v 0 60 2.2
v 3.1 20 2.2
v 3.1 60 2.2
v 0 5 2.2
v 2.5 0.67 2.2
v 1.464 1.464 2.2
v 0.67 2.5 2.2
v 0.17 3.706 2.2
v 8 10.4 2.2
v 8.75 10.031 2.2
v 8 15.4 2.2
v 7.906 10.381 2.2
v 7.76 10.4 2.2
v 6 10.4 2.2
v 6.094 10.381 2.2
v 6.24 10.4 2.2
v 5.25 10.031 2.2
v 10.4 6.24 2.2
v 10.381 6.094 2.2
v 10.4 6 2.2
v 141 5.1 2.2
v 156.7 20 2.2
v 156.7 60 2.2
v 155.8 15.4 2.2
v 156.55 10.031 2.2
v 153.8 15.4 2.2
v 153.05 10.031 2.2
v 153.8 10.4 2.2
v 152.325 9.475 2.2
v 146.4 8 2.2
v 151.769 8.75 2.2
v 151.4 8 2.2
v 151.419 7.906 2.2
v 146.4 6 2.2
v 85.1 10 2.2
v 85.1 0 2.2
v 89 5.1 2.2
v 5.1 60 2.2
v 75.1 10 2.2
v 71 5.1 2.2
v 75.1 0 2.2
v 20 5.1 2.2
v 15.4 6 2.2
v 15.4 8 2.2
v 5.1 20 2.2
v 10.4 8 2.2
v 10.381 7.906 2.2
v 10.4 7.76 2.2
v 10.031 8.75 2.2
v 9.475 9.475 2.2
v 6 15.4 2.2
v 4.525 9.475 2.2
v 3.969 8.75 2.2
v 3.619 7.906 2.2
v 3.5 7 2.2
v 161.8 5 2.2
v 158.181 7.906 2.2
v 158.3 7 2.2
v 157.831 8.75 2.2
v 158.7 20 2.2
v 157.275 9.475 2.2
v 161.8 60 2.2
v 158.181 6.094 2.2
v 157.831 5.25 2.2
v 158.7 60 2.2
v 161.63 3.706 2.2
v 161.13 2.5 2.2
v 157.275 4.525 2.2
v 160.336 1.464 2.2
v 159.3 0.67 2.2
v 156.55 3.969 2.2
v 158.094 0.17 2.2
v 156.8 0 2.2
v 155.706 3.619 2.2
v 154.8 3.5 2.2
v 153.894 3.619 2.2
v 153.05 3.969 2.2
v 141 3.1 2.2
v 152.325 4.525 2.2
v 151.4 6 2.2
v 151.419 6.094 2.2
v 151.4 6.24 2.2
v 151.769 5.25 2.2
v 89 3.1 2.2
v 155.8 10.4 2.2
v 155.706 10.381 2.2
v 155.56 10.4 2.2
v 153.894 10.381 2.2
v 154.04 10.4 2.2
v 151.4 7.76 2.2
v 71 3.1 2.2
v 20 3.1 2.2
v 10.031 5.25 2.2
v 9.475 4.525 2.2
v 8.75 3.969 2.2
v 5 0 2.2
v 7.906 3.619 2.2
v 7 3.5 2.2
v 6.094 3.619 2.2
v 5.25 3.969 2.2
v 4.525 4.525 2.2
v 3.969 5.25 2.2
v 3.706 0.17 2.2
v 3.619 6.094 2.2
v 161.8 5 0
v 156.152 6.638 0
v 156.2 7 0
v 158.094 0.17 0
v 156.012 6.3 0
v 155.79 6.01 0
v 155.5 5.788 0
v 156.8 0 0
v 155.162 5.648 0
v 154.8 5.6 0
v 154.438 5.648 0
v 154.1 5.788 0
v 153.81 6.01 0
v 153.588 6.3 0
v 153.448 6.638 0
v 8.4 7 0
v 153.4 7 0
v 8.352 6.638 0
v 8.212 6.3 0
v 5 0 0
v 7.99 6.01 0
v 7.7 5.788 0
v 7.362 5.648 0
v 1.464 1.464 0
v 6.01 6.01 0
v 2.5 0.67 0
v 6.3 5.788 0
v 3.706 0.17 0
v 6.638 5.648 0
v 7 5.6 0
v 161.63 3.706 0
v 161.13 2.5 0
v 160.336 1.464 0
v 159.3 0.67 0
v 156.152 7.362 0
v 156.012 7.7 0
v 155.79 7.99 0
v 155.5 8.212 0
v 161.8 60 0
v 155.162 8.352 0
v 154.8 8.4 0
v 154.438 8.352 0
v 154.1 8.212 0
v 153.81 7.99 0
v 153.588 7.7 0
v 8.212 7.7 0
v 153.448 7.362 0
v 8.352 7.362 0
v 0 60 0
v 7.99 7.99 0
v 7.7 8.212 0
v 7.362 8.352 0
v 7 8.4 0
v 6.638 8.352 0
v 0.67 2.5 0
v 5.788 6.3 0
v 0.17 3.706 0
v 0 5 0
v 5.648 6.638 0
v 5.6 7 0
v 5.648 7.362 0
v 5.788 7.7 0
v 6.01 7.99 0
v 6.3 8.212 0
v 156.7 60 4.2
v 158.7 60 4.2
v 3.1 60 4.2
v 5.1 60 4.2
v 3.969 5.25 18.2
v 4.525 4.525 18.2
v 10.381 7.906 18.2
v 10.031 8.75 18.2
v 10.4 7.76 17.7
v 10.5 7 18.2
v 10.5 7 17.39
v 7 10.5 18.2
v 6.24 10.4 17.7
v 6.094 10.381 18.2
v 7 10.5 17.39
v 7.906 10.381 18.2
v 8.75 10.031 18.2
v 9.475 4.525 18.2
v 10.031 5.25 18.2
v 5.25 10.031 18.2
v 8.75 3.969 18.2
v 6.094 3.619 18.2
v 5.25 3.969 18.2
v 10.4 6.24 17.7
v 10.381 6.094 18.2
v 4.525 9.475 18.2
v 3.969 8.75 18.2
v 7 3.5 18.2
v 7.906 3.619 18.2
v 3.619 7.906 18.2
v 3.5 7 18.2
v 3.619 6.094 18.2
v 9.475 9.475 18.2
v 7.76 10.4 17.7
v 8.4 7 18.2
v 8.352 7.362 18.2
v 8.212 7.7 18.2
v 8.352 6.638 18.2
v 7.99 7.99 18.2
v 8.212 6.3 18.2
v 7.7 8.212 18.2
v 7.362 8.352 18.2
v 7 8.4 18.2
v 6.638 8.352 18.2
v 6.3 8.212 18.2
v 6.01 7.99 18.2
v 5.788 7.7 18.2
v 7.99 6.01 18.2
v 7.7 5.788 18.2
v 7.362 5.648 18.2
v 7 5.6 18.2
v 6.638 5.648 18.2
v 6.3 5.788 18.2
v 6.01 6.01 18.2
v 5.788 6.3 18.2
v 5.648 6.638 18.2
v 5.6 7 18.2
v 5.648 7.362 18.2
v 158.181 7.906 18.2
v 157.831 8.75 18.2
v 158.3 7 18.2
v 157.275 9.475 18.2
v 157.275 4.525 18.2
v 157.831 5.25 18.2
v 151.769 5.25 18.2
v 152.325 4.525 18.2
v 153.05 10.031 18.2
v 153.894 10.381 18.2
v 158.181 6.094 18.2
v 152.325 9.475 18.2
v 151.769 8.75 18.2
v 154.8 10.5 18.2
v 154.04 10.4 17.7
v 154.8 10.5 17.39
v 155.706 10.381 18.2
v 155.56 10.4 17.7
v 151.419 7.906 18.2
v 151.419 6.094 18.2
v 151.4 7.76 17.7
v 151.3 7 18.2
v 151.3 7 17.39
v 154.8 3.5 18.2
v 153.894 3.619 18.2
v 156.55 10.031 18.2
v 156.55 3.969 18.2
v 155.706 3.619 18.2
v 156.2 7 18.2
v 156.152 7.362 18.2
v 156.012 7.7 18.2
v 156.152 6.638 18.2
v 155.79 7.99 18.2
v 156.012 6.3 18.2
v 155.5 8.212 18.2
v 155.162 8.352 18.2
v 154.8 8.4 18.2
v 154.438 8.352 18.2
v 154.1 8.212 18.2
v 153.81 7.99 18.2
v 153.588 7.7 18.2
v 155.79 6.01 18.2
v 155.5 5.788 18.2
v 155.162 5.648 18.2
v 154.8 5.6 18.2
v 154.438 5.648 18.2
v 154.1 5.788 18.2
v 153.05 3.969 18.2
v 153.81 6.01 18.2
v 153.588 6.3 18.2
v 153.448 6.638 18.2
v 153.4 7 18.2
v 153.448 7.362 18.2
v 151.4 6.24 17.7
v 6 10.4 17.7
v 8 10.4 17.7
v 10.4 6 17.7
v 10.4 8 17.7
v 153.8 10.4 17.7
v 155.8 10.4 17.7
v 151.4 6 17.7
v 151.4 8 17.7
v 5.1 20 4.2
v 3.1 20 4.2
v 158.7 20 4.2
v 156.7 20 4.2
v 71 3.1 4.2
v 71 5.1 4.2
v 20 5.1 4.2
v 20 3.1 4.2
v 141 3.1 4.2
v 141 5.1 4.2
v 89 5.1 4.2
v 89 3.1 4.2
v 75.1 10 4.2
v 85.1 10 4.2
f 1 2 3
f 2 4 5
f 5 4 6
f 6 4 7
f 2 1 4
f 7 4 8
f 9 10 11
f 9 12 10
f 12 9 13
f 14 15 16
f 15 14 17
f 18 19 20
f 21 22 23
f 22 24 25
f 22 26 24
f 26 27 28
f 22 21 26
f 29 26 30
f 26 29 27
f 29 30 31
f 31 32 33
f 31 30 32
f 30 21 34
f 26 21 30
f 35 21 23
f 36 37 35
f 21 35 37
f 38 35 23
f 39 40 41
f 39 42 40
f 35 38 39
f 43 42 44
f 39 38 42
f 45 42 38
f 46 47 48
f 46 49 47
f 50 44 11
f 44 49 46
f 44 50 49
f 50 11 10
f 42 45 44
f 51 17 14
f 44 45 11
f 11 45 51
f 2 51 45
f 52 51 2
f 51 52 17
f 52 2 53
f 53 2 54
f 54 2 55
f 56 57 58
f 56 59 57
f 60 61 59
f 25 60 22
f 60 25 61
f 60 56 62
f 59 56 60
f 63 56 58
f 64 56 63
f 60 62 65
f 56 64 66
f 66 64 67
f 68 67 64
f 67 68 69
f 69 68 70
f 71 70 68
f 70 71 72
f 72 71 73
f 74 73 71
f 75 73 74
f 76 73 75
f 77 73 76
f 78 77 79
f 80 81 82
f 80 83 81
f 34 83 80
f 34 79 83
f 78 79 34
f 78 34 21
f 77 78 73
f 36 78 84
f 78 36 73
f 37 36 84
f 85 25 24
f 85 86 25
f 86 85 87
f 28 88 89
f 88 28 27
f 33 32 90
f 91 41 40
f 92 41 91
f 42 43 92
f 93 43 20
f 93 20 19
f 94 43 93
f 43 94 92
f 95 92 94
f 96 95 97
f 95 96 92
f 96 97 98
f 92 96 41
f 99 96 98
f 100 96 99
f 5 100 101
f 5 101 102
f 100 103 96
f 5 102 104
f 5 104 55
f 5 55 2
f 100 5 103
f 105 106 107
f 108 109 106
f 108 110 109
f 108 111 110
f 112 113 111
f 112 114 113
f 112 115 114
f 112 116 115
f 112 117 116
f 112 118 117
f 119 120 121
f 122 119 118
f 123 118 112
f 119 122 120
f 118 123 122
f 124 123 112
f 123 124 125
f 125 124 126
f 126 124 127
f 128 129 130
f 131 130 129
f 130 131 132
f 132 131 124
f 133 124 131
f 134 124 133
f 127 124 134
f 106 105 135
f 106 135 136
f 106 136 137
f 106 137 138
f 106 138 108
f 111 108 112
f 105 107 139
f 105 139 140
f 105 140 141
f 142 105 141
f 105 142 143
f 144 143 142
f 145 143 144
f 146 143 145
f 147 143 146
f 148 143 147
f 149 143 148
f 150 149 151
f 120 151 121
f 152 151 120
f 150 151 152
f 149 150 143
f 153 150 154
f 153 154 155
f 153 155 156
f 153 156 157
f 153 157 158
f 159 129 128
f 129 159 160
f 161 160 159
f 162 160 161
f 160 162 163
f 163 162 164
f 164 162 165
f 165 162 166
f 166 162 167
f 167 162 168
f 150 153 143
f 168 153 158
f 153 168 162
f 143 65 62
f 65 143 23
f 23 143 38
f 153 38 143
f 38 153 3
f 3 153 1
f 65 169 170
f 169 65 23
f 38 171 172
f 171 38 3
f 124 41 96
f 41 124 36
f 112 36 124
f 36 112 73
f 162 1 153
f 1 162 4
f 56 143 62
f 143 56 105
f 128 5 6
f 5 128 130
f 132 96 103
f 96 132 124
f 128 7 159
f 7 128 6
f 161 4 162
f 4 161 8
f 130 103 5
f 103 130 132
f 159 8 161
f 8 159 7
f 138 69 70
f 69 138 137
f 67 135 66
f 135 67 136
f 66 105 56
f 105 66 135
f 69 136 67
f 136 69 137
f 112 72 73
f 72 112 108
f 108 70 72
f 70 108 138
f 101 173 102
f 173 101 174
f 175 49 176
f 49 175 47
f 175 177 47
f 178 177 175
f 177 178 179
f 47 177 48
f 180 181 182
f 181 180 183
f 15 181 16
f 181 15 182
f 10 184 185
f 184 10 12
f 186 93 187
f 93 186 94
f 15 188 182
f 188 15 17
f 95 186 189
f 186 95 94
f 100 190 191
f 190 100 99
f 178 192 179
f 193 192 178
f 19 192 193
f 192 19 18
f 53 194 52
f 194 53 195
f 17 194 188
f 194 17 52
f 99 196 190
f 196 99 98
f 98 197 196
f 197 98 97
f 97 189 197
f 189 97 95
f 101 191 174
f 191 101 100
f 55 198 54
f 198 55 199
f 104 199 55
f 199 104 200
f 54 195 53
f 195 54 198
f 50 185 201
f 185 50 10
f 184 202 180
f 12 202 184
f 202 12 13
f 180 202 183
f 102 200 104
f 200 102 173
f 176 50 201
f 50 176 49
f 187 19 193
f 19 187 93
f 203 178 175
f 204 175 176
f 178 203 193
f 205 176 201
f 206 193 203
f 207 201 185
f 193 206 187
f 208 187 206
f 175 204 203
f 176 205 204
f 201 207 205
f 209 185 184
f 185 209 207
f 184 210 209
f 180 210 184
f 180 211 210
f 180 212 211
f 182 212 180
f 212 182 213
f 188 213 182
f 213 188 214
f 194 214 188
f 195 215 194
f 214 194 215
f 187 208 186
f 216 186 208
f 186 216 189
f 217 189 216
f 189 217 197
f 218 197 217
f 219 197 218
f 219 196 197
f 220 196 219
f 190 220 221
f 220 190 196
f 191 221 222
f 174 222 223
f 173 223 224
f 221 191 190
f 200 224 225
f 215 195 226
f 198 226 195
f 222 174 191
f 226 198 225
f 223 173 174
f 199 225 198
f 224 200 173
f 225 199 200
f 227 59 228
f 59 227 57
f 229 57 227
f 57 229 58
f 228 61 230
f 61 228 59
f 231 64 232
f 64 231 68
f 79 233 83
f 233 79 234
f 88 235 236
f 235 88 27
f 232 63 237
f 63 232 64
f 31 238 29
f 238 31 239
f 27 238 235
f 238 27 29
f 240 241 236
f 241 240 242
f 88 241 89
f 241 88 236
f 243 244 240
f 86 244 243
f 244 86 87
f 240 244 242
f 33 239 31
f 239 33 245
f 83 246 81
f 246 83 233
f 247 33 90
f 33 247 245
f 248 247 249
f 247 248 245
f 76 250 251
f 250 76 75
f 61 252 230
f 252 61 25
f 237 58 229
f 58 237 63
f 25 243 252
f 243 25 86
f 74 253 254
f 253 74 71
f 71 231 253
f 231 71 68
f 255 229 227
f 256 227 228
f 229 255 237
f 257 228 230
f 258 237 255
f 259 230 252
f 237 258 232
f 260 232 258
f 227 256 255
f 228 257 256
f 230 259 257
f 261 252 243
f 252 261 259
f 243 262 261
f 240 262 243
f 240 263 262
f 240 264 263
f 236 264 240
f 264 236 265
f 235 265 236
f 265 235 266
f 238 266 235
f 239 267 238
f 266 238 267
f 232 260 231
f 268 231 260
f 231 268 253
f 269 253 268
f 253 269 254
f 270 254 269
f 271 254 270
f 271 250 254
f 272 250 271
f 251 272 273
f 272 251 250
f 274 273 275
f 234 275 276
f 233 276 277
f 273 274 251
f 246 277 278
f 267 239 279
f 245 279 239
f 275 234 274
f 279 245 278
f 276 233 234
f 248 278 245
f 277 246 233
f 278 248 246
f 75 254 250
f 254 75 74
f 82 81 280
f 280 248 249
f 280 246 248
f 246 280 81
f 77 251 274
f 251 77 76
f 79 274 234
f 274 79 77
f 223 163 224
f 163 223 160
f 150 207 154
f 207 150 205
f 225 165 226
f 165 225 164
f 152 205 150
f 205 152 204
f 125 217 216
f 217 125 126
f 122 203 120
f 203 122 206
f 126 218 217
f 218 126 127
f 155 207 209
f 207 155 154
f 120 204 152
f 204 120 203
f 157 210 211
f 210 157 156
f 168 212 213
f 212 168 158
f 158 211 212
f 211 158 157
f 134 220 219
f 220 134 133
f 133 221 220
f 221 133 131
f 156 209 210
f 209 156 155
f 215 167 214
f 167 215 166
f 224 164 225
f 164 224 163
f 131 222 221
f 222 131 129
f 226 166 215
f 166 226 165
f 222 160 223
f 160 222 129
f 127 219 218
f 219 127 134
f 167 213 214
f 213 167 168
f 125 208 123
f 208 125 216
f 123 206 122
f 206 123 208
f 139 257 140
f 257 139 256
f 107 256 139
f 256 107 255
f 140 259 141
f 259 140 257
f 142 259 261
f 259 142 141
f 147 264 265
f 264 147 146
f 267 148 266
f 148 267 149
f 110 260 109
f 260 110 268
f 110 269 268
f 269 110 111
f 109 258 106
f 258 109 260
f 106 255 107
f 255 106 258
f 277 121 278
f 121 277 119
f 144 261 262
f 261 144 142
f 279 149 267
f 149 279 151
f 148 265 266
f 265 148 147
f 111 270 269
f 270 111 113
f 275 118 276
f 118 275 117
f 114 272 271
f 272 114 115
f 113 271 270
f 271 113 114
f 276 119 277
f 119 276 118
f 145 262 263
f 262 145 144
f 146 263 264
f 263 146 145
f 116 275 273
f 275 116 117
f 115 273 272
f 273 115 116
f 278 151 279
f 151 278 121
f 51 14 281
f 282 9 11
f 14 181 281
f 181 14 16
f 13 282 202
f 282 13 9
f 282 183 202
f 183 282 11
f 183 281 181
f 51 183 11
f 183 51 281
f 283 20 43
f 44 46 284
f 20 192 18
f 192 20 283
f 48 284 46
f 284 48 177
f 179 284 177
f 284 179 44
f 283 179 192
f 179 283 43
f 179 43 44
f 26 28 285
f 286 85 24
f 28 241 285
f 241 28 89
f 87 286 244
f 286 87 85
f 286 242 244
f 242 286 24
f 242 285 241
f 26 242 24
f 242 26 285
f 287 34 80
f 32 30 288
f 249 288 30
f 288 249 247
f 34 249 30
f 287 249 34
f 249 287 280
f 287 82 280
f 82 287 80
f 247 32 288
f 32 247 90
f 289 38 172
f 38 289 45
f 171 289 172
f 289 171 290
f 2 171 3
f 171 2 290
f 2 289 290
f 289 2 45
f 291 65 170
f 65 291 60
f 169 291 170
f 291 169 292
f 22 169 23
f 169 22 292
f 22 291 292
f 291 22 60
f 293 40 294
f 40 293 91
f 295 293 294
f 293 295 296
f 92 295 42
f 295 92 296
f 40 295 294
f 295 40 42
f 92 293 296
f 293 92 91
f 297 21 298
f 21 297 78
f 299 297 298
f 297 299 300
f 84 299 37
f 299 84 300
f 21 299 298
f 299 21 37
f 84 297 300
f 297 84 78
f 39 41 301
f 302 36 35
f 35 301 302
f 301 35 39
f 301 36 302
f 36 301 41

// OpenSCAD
//BASE
$fn=24;
//Deck and Towers
difference() {
    union() {
        #translate([5,5,0])
            cube([151.8,55,2.2]);
        translate([5,0,0])
            cube([151.8,5,2.2]);
        translate([0,5,0])
            cube([5,55,2.2]);
        translate([156.8,5,0])
            cube([5,55,2.2]);    
        translate([5,5,0])
            cylinder(h=2.2,r1=5,r2=5);
        translate([156.8,5,0])
            cylinder(h=2.2,r1=5,r2=5);
        translate([7,7,0])
            cylinder(h=18.2,r1=3.5,r2=3.5);
        translate([154.8,7,0])
            cylinder(h=18.2,r1=3.5,r2=3.5);
    }
    translate([7,7,-4])
        cylinder(d=2.8,h=26);
    translate([154.8,7,-4])
        cylinder(d=2.8,h=26);
}
//Tower Supports
//Trigon0Y
translate([6,10.4,2.2])
    {TrigonPoints = [
    [0,0,0],//0
    [0,5,0],//1
    [0,0,15.5],//2
    [2,0,0],//3
    [2,5,0],//4
    [2,0,15.5]];//5
    TrigonFaces = [
    [0,1,2],//outside
    [0,3,4,1],//bottom
    [0,2,5,3],//top    
    [2,1,4,5],//back
    [3,5,4]];//inside
polyhedron(TrigonPoints,TrigonFaces);}
//Trigon0Yright
translate([10.4,6,2.2])
    {TrigonPoints = [
    [0,0,0],//0
    [5,0,0],//1
    [0,0,15.5],//2
    [0,2,0],//3
    [5,2,0],//4
    [0,2,15.5]]; //5
    TrigonFaces = [
    [0,2,1],//outside
    [0,1,4,3],//bottom
    [0,3,5,2],//top
    [1,2,5,4],//back
    [3,4,5]];//inside
polyhedron(TrigonPoints,TrigonFaces);}//
//Trigon3Y
translate([153.8,10.4,2.2])
    {TrigonPoints = [
    [0,0,0],//0
    [0,5,0],//1
    [0,0,15.5],//2
    [2,0,0],//3
    [2,5,0],//4
    [2,0,15.5]]; //5
    TrigonFaces = [
    [0,1,2],//outside
    [0,3,4,1],//bottom
    [0,2,5,3],//top
    [2,1,4,5],//back
    [3,5,4]];//inside
polyhedron(TrigonPoints,TrigonFaces);}
//Trigon3Yleft
translate([146.4,6,2.2])
    {TrigonPoints = [
    [0,0,0],//0
    [5,0,0],//1
    [5,0,15.5],//2
    [0,2,0],//3
    [5,2,0],//4
    [5,2,15.5]]; //5
    TrigonFaces = [
    [0,2,1],//outside
    [0,1,4,3],//bottom
    [0,3,5,2],//top
    [1,2,5,4],//back
    [3,4,5]];//inside
polyhedron(TrigonPoints,TrigonFaces);}
//Ribs
translate([3.1,20,2.2])
    cube([2,40,2]);
translate([156.7,20,2.2])
    cube([2,40,2]);
translate([20,3.1,2.2])
    cube([51,2,2]);
translate([89,3.1,2.2])
    cube([52,2,2]);    
;
//USB Ramp
translate([98.1,0,2.2])
    rotate([0,0,90])
polyhedron(points=[[0,13,0], [10,13,0], [10,23,0], [0,23,0], [10,13,2], [10,23,2]],
    faces=[[0,1,2,3],[1,4,5,2],[0,3,5,4],[0,4,1],[3,2,5]]
             );
